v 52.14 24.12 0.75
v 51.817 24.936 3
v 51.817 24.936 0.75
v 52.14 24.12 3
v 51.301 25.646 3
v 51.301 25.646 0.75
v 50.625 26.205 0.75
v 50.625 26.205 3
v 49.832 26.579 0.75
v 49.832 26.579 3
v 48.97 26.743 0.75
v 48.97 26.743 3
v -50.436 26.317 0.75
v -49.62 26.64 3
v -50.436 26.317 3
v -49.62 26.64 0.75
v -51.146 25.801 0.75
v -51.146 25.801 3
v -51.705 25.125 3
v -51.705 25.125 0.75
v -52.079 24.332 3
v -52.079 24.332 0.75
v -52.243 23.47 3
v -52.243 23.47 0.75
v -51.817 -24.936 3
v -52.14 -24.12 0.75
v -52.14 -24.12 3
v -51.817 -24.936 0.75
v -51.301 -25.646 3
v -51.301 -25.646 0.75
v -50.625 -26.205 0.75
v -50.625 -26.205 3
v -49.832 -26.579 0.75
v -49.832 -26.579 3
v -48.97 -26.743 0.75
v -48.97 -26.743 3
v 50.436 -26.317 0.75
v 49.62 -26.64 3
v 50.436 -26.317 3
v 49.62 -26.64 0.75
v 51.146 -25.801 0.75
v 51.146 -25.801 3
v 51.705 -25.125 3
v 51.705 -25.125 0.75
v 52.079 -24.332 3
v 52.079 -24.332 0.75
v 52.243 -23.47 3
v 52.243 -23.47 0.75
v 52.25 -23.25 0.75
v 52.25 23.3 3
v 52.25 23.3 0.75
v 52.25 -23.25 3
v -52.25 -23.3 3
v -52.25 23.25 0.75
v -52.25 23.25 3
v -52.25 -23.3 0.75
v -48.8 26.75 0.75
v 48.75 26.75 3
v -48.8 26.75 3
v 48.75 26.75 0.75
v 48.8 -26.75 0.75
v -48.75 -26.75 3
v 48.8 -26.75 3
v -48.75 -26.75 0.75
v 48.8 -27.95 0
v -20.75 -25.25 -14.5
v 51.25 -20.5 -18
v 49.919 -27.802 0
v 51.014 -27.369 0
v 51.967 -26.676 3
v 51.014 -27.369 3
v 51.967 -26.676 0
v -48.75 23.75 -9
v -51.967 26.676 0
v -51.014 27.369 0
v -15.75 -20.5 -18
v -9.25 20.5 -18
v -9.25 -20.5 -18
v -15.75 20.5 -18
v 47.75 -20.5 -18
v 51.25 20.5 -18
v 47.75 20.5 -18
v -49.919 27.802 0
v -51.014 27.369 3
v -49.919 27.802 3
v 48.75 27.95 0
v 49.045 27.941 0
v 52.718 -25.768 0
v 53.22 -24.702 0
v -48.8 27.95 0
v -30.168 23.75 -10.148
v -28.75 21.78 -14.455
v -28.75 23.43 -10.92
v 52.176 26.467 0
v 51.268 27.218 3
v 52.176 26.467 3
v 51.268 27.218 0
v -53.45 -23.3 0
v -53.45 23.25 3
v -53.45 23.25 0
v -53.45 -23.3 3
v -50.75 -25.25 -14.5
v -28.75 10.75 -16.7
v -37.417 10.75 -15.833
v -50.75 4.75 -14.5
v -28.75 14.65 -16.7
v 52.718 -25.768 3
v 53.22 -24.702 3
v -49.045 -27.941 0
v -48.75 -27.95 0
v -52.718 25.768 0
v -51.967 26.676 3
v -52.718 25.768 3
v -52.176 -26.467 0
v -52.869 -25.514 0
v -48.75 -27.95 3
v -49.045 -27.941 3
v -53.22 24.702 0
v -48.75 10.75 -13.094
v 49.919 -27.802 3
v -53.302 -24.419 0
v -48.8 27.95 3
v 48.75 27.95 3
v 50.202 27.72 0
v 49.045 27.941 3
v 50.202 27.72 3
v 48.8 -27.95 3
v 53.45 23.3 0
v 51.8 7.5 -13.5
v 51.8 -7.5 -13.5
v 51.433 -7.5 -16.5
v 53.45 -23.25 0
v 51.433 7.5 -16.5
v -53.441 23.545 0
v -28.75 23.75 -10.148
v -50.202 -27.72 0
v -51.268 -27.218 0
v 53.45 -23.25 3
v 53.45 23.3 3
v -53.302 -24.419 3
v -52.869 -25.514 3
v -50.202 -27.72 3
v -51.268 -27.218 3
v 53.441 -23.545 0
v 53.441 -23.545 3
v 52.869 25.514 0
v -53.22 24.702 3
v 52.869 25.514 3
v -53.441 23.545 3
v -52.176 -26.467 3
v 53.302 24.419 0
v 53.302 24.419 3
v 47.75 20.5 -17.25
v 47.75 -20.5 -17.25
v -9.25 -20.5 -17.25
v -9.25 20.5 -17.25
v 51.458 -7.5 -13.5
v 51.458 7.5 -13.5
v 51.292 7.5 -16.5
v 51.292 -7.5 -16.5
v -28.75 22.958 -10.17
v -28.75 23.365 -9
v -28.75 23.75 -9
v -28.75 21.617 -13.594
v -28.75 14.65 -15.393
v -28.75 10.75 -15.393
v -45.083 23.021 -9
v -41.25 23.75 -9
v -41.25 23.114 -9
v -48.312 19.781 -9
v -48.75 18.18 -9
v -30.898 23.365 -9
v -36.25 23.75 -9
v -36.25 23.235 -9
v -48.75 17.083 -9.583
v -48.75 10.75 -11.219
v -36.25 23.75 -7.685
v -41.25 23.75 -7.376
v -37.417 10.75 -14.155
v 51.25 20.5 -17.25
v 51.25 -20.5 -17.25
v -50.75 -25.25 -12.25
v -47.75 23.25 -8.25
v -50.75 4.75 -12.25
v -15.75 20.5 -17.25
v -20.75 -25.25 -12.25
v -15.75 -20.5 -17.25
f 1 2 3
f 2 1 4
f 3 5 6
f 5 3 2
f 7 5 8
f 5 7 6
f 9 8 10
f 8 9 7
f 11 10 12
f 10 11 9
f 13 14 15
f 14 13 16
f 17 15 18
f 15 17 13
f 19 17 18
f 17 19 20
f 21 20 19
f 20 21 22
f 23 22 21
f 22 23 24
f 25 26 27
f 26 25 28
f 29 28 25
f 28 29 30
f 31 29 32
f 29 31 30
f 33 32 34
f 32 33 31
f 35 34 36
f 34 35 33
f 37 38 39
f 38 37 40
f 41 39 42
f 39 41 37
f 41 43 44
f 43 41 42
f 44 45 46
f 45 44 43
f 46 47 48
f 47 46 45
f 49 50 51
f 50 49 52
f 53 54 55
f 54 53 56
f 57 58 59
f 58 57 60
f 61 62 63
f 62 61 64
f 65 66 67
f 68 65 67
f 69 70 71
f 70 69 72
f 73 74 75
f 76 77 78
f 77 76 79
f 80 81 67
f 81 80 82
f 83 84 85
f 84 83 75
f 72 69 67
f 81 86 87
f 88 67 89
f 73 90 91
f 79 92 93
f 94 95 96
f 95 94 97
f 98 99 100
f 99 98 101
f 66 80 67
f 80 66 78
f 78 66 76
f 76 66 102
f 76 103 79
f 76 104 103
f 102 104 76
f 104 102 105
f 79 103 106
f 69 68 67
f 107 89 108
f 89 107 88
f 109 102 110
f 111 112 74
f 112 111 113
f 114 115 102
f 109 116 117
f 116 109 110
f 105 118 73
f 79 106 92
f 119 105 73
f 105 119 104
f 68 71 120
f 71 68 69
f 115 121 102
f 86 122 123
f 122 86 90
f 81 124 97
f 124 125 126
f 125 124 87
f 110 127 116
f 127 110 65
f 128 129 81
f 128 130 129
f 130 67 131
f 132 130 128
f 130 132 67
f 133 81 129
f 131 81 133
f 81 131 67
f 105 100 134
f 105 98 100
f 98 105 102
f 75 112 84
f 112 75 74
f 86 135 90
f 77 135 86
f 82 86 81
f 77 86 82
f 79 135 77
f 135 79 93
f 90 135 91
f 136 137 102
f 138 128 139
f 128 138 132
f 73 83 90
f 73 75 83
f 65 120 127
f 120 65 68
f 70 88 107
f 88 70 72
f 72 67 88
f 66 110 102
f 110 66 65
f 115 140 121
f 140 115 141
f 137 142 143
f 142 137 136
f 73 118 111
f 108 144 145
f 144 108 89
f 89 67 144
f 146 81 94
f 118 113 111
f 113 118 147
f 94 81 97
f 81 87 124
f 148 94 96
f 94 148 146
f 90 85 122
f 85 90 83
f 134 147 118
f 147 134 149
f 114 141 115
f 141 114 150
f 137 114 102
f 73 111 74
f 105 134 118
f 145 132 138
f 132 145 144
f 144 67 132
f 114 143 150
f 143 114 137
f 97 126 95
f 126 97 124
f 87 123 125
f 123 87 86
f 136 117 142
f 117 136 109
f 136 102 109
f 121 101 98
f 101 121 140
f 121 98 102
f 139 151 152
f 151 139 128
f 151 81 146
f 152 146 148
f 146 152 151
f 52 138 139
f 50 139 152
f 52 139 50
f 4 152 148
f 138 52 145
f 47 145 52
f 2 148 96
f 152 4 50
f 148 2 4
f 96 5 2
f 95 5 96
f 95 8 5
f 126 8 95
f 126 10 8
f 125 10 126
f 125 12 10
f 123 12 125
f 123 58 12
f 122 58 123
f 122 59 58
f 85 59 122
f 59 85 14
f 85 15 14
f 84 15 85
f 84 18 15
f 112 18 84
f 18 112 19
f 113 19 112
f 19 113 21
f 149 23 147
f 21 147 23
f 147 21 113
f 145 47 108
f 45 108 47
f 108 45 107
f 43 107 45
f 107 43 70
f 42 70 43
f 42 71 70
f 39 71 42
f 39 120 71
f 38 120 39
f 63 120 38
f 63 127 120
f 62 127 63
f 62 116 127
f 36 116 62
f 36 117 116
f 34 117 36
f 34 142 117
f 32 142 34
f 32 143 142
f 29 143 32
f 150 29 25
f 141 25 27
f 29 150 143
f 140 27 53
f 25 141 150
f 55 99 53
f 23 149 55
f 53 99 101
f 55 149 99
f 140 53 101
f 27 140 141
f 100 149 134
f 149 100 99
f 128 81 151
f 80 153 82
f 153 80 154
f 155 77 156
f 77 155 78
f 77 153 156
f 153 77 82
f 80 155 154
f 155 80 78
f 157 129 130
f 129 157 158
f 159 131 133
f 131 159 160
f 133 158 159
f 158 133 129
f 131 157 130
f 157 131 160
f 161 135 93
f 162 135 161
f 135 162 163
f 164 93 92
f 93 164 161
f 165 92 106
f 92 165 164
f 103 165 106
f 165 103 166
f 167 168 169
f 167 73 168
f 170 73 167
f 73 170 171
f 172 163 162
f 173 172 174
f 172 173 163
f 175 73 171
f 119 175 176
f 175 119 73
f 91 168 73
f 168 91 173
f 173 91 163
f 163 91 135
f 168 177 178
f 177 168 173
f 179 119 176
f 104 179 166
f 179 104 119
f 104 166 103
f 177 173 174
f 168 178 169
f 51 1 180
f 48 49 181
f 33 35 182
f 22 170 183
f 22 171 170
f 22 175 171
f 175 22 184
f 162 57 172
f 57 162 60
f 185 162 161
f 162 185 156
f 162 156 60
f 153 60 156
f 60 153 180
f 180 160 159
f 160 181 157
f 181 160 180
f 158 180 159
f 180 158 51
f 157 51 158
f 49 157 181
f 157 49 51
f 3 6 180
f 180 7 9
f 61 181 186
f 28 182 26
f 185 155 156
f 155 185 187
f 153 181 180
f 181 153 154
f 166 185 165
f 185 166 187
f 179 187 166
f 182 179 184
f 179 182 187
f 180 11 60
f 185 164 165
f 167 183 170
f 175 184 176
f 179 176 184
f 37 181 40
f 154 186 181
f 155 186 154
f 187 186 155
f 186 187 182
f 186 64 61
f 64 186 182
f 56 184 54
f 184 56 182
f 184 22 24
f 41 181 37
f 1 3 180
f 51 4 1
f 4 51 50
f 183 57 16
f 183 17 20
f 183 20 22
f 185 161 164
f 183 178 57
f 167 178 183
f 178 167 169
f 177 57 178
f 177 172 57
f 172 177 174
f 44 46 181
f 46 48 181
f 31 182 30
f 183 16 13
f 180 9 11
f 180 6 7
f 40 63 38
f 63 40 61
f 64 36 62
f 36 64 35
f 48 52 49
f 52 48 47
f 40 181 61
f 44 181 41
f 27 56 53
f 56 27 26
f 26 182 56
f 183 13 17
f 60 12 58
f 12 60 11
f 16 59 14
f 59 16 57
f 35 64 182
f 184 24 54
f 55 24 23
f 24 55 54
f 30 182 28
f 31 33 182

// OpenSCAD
epaisseur1=1.5;
radius=2;
xc=101.5;
yc=50.5;
xb=xc+2*epaisseur1;
yb=yc+2*epaisseur1;
offset=4.5;
voffset = .75;
rebord = 3;
epaisseur=1.2;
marge_ba=1.2;
hecran=57;

difference () {

// coque de base
hull () {
        
      // cube de coque (ecran
        translate([xc/2-(hecran+4.5+5.5)/2+0.5,0,-9])
        cube([hecran+4.5+5.5, 41, 18], center = true);

      // GPS
      translate([-xc/2+30/2,-yc/2+30/2,-(13+epaisseur1)/2])
        cube([30, 30, 13+epaisseur1], center = true);

      // Inter
      translate([-xc/2+20/2+4/2,yc/2-13/2-3/2,-4.5])
      cube([20, 13, 9], center = true);
        
        translate([0,0,rebord / 2])
        roundCornersCube(xb+epaisseur*2,yb+epaisseur*2,rebord,radius+epaisseur+epaisseur1);

    }

// ceci est la box inferieure (exterieur)
translate([0,0,25+marge_ba])
roundCornersCube(xb,yb,50,radius+epaisseur1);

// ceci est l'ecran
translate([xb/2-57/2-offset,0,-2])
cube([57, 41, 100], center = true);

// ceci est la SD
translate([xb/2,0,-1.5-13.5])
cube([20, 15, 3], center = true);

// Inter
translate([-xc/2+20/2+4/2,yc/2-13/2-3/2,-4.5-9])
#cube([20, 13, 9], center = true);

// Inter
translate([-xc/2+20/2+4/2,yc/2-13/2-3/2,-15])
cube([5, 13, 30], center = true);

// on evide l'interieur
hull() {
        
      // cube de coque
        translate([xc/2-(hecran+4.5+5.5)/2+0.5,0,-9+voffset])
        cube([hecran+4.5+5.5, 41, 18], center = true);

      // GPS
      translate([-xc/2+30/2,-yc/2+30/2,-6.5+voffset])
        cube([30, 30, 13], center = true);

      // Inter
      translate([-xc/2+30/2+3/2,-2/2,-4.5+voffset])
        cube([30-3, yc-2, 9], center = true);
        
        translate([0,0,2+voffset])
        roundCornersCube(xb,yb,4,radius+epaisseur1);
        
    }


}

/////////////////////////////////
/////////////////////////////////
/////////////////////////////////
/////////////////////////////////

module createMeniscus(h,radius) // This module creates the shape that needs to be substracted from a cube to make its corners rounded.
difference(){        //This shape is basicly the difference between a quarter of cylinder and a cube
   translate([radius/2+0.1,radius/2+0.1,0]){
      cube([radius+0.2,radius+0.1,h+0.2],center=true);         // All that 0.x numbers are to avoid "ghost boundaries" when substracting
   }

   cylinder(h=h+0.2,r=radius,$fn = 25,center=true);
}


module roundCornersCube(x,y,z,r)  // Now we just substract the shape we have created in the four corners
difference(){
   cube([x,y,z], center=true);

translate([x/2-r,y/2-r]){  // We move to the first corner (x,y)
      rotate(0){  
         createMeniscus(z,r); // And substract the meniscus
      }
   }
   translate([-x/2+r,y/2-r]){ // To the second corner (-x,y)
      rotate(90){
         createMeniscus(z,r); // But this time we have to rotate the meniscus 90 deg
      }
   }
      translate([-x/2+r,-y/2+r]){ // ... 
      rotate(180){
         createMeniscus(z,r);
      }
   }
      translate([x/2-r,-y/2+r]){
      rotate(270){
         createMeniscus(z,r);
      }
   }
}
